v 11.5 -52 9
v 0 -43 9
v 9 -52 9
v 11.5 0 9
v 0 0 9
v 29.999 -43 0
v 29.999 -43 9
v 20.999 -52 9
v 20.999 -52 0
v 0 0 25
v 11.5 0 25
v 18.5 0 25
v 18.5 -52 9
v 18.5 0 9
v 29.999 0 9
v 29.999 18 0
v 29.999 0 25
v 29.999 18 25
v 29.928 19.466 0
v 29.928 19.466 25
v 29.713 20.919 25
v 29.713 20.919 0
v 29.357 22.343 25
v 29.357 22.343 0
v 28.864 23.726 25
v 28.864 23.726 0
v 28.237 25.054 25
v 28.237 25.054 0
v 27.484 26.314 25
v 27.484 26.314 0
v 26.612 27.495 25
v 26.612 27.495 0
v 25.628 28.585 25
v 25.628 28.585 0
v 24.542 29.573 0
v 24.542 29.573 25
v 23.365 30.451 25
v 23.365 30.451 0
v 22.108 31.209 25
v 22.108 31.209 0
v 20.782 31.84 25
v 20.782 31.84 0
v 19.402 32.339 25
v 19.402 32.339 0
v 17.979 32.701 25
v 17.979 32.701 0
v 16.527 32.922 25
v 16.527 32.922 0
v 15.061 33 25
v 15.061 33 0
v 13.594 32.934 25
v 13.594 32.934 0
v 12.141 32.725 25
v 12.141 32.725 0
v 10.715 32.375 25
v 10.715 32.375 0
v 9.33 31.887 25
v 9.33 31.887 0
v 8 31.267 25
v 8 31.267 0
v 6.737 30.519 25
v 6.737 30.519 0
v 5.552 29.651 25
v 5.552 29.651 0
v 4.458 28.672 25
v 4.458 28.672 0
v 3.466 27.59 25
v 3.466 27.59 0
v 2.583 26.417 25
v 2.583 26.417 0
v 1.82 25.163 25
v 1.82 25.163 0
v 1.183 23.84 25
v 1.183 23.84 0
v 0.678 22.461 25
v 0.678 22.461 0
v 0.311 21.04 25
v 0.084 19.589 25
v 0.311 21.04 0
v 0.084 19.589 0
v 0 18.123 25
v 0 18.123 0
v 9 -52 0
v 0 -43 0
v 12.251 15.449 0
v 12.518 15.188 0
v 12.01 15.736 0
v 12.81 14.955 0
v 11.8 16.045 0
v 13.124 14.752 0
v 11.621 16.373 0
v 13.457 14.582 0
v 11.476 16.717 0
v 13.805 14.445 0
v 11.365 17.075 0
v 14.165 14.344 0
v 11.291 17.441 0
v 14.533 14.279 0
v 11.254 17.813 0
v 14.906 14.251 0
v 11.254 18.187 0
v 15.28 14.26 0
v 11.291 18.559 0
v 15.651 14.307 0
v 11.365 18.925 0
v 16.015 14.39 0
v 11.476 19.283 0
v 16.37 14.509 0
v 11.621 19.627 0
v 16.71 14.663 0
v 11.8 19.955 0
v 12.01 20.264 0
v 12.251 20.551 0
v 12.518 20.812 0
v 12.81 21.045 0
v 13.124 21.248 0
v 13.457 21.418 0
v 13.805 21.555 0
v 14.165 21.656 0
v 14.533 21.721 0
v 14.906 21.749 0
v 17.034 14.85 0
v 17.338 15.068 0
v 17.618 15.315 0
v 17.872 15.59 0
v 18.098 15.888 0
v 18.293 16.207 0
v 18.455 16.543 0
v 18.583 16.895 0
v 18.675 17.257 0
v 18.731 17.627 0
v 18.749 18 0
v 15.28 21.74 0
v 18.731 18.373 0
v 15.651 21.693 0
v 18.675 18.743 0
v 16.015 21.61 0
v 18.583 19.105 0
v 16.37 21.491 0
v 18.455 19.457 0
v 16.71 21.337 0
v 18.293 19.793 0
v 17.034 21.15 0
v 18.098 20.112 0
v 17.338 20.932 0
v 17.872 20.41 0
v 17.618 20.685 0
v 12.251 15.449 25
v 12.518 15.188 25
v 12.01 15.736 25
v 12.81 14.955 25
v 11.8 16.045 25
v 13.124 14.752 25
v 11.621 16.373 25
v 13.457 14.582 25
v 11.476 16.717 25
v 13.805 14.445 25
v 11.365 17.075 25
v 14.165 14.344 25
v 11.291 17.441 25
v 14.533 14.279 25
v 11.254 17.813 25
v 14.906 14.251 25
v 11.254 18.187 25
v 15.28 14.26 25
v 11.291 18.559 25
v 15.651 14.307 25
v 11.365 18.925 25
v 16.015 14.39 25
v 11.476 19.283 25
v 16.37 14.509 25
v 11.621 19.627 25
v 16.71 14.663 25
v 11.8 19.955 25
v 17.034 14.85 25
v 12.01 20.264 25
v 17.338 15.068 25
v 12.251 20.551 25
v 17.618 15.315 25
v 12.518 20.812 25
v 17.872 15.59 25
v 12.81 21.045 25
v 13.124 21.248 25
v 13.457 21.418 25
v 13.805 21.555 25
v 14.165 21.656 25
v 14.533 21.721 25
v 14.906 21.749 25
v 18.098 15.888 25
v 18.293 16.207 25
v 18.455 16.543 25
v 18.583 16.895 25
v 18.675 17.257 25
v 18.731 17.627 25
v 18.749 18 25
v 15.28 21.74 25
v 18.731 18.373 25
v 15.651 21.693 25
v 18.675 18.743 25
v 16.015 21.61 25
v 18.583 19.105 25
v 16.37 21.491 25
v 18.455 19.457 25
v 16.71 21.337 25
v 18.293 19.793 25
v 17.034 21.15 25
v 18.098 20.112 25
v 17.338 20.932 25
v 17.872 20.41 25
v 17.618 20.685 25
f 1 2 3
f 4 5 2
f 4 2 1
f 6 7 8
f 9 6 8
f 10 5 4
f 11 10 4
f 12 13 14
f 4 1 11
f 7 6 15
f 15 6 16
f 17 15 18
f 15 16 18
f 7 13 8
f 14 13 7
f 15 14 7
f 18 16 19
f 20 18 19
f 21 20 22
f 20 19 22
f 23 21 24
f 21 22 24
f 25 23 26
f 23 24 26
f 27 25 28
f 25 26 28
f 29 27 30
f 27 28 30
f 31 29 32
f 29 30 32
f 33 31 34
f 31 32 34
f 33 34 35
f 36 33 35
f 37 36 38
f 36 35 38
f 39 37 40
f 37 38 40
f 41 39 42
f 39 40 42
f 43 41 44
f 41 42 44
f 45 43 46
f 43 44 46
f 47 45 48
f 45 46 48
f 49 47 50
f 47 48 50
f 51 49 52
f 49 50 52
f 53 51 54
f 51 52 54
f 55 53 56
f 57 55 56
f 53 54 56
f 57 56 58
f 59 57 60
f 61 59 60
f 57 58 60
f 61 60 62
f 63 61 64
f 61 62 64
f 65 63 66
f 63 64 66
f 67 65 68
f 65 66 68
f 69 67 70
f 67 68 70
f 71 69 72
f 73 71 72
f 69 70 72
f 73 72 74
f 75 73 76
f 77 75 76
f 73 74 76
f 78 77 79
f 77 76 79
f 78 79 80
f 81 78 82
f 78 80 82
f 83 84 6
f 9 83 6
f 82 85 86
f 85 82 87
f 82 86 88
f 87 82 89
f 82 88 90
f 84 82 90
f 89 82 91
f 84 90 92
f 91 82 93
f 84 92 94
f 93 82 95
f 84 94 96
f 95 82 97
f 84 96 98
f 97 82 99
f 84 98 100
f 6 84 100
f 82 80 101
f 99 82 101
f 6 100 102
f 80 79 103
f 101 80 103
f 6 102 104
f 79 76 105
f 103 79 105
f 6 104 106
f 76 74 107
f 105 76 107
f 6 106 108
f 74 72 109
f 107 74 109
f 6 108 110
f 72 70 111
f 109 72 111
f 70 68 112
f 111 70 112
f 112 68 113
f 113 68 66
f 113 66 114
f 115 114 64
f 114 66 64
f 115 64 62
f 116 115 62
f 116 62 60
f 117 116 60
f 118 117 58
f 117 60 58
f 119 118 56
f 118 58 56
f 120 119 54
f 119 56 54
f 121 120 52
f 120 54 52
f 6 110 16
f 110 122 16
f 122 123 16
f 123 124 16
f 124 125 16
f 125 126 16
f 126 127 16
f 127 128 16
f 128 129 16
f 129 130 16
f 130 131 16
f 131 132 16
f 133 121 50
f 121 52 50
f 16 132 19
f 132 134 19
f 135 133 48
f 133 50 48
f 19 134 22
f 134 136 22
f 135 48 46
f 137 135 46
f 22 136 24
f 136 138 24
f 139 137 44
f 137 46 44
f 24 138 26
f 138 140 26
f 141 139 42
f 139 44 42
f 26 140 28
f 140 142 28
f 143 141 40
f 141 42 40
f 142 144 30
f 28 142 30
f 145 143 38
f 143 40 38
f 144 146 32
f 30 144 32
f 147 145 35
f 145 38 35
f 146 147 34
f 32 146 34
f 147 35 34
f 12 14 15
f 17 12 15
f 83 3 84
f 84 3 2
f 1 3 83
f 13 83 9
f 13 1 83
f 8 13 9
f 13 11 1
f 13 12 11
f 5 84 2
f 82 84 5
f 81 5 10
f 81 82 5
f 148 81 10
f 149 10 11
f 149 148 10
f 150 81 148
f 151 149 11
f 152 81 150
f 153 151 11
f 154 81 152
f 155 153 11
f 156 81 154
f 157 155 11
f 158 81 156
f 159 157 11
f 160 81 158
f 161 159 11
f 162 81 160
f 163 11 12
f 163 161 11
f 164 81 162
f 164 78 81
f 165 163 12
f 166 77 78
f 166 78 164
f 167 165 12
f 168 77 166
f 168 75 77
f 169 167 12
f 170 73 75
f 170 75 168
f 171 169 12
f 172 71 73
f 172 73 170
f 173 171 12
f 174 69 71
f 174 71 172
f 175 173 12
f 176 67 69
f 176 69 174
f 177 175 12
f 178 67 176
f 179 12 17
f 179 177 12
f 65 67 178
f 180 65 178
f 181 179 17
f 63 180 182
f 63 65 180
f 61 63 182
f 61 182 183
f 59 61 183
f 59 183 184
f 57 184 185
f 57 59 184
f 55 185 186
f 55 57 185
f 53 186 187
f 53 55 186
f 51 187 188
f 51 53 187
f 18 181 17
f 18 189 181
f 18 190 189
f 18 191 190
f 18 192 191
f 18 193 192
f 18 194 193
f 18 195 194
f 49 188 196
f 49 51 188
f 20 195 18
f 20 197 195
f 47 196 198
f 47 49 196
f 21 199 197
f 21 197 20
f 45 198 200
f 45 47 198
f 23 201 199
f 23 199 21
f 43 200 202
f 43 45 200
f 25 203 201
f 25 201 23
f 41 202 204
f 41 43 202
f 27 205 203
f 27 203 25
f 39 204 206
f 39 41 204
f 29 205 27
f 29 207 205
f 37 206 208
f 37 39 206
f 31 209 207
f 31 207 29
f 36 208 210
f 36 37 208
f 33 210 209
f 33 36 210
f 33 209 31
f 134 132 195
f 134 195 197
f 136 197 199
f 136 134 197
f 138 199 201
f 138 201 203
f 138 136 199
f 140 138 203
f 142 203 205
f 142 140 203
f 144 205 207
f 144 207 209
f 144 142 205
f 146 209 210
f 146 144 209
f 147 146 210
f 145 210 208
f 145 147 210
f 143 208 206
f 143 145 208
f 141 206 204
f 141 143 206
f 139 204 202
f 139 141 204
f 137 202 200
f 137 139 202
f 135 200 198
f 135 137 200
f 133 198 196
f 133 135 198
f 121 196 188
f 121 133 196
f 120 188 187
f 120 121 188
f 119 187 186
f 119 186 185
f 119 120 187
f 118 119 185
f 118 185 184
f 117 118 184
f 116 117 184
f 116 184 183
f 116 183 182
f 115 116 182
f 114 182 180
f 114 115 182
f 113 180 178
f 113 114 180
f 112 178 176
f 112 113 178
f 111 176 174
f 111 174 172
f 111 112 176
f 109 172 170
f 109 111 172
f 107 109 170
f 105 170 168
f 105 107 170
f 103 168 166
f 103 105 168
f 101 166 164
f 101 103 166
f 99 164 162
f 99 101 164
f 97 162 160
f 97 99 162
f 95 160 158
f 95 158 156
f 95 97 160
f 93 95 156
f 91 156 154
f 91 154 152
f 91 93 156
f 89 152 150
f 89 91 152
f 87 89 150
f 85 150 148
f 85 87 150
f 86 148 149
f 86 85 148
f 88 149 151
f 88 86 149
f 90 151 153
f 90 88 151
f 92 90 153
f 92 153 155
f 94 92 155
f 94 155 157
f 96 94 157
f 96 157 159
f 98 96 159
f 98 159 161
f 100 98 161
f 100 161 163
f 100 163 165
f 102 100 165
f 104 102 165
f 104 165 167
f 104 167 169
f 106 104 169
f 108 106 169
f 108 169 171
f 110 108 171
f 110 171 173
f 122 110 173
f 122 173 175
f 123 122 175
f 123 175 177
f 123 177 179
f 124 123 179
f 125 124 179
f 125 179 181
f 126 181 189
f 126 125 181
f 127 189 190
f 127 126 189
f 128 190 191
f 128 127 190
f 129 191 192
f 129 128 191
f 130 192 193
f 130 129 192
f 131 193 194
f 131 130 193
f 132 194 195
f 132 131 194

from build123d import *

# Parameters (mm, degrees)
F0_R          = 3.75
F1_DEPTH      = 25
F2_W          = 29.9994934789
F2_H          = 9
F3_DEPTH      = 52
F5_DEPTH      = 25
F8_DEPTH      = 3.5
F8_DEPTH_BACK = 3.5


with BuildPart() as f1:
    # F0 (on Top) → F1 (new body)
    with BuildSketch(Plane.XY):
        with BuildLine():
            Line((0, 18.1232695296), (0, 0))
            Line((0, 0), (29.9994934789, 0))
            Line((29.9994934789, 0), (29.9994934789, 18))
            ThreePointArc((29.9994934789, 18), (15.061128764, 32.9998733692), (0, 18.1232695296))
        make_face()
        with Locations((14.9994934789, 18)):
            Circle(F0_R, mode=Mode.SUBTRACT)
    extrude(amount=F1_DEPTH)

    # F2 (on face) → F3 (join)
    with BuildSketch(Plane.XZ):
        with Locations((14.9997467394, 4.5)):
            Rectangle(F2_W, F2_H)
    extrude(amount=F3_DEPTH)

    # F4 (on face) → F5 (cut)
    with BuildSketch(Plane.XY.offset(9)):
        Polygon((20.9994934789, -52), (29.9994934789, -52), (29.9994934789, -43), align=None)
        Polygon((0, -43), (0, -52), (9, -52), align=None)
    extrude(amount=-F5_DEPTH, mode=Mode.SUBTRACT)

    # F7 (on mid) → F8 (join, two sides)
    with BuildSketch(Plane.YZ.offset(14.9997467394)) as f8_sk:
        Polygon((0, 9), (0, 25), (-52, 9), align=None)
    extrude(amount=F8_DEPTH)
    extrude(f8_sk.sketch, amount=-F8_DEPTH_BACK)


solid = f1.part
